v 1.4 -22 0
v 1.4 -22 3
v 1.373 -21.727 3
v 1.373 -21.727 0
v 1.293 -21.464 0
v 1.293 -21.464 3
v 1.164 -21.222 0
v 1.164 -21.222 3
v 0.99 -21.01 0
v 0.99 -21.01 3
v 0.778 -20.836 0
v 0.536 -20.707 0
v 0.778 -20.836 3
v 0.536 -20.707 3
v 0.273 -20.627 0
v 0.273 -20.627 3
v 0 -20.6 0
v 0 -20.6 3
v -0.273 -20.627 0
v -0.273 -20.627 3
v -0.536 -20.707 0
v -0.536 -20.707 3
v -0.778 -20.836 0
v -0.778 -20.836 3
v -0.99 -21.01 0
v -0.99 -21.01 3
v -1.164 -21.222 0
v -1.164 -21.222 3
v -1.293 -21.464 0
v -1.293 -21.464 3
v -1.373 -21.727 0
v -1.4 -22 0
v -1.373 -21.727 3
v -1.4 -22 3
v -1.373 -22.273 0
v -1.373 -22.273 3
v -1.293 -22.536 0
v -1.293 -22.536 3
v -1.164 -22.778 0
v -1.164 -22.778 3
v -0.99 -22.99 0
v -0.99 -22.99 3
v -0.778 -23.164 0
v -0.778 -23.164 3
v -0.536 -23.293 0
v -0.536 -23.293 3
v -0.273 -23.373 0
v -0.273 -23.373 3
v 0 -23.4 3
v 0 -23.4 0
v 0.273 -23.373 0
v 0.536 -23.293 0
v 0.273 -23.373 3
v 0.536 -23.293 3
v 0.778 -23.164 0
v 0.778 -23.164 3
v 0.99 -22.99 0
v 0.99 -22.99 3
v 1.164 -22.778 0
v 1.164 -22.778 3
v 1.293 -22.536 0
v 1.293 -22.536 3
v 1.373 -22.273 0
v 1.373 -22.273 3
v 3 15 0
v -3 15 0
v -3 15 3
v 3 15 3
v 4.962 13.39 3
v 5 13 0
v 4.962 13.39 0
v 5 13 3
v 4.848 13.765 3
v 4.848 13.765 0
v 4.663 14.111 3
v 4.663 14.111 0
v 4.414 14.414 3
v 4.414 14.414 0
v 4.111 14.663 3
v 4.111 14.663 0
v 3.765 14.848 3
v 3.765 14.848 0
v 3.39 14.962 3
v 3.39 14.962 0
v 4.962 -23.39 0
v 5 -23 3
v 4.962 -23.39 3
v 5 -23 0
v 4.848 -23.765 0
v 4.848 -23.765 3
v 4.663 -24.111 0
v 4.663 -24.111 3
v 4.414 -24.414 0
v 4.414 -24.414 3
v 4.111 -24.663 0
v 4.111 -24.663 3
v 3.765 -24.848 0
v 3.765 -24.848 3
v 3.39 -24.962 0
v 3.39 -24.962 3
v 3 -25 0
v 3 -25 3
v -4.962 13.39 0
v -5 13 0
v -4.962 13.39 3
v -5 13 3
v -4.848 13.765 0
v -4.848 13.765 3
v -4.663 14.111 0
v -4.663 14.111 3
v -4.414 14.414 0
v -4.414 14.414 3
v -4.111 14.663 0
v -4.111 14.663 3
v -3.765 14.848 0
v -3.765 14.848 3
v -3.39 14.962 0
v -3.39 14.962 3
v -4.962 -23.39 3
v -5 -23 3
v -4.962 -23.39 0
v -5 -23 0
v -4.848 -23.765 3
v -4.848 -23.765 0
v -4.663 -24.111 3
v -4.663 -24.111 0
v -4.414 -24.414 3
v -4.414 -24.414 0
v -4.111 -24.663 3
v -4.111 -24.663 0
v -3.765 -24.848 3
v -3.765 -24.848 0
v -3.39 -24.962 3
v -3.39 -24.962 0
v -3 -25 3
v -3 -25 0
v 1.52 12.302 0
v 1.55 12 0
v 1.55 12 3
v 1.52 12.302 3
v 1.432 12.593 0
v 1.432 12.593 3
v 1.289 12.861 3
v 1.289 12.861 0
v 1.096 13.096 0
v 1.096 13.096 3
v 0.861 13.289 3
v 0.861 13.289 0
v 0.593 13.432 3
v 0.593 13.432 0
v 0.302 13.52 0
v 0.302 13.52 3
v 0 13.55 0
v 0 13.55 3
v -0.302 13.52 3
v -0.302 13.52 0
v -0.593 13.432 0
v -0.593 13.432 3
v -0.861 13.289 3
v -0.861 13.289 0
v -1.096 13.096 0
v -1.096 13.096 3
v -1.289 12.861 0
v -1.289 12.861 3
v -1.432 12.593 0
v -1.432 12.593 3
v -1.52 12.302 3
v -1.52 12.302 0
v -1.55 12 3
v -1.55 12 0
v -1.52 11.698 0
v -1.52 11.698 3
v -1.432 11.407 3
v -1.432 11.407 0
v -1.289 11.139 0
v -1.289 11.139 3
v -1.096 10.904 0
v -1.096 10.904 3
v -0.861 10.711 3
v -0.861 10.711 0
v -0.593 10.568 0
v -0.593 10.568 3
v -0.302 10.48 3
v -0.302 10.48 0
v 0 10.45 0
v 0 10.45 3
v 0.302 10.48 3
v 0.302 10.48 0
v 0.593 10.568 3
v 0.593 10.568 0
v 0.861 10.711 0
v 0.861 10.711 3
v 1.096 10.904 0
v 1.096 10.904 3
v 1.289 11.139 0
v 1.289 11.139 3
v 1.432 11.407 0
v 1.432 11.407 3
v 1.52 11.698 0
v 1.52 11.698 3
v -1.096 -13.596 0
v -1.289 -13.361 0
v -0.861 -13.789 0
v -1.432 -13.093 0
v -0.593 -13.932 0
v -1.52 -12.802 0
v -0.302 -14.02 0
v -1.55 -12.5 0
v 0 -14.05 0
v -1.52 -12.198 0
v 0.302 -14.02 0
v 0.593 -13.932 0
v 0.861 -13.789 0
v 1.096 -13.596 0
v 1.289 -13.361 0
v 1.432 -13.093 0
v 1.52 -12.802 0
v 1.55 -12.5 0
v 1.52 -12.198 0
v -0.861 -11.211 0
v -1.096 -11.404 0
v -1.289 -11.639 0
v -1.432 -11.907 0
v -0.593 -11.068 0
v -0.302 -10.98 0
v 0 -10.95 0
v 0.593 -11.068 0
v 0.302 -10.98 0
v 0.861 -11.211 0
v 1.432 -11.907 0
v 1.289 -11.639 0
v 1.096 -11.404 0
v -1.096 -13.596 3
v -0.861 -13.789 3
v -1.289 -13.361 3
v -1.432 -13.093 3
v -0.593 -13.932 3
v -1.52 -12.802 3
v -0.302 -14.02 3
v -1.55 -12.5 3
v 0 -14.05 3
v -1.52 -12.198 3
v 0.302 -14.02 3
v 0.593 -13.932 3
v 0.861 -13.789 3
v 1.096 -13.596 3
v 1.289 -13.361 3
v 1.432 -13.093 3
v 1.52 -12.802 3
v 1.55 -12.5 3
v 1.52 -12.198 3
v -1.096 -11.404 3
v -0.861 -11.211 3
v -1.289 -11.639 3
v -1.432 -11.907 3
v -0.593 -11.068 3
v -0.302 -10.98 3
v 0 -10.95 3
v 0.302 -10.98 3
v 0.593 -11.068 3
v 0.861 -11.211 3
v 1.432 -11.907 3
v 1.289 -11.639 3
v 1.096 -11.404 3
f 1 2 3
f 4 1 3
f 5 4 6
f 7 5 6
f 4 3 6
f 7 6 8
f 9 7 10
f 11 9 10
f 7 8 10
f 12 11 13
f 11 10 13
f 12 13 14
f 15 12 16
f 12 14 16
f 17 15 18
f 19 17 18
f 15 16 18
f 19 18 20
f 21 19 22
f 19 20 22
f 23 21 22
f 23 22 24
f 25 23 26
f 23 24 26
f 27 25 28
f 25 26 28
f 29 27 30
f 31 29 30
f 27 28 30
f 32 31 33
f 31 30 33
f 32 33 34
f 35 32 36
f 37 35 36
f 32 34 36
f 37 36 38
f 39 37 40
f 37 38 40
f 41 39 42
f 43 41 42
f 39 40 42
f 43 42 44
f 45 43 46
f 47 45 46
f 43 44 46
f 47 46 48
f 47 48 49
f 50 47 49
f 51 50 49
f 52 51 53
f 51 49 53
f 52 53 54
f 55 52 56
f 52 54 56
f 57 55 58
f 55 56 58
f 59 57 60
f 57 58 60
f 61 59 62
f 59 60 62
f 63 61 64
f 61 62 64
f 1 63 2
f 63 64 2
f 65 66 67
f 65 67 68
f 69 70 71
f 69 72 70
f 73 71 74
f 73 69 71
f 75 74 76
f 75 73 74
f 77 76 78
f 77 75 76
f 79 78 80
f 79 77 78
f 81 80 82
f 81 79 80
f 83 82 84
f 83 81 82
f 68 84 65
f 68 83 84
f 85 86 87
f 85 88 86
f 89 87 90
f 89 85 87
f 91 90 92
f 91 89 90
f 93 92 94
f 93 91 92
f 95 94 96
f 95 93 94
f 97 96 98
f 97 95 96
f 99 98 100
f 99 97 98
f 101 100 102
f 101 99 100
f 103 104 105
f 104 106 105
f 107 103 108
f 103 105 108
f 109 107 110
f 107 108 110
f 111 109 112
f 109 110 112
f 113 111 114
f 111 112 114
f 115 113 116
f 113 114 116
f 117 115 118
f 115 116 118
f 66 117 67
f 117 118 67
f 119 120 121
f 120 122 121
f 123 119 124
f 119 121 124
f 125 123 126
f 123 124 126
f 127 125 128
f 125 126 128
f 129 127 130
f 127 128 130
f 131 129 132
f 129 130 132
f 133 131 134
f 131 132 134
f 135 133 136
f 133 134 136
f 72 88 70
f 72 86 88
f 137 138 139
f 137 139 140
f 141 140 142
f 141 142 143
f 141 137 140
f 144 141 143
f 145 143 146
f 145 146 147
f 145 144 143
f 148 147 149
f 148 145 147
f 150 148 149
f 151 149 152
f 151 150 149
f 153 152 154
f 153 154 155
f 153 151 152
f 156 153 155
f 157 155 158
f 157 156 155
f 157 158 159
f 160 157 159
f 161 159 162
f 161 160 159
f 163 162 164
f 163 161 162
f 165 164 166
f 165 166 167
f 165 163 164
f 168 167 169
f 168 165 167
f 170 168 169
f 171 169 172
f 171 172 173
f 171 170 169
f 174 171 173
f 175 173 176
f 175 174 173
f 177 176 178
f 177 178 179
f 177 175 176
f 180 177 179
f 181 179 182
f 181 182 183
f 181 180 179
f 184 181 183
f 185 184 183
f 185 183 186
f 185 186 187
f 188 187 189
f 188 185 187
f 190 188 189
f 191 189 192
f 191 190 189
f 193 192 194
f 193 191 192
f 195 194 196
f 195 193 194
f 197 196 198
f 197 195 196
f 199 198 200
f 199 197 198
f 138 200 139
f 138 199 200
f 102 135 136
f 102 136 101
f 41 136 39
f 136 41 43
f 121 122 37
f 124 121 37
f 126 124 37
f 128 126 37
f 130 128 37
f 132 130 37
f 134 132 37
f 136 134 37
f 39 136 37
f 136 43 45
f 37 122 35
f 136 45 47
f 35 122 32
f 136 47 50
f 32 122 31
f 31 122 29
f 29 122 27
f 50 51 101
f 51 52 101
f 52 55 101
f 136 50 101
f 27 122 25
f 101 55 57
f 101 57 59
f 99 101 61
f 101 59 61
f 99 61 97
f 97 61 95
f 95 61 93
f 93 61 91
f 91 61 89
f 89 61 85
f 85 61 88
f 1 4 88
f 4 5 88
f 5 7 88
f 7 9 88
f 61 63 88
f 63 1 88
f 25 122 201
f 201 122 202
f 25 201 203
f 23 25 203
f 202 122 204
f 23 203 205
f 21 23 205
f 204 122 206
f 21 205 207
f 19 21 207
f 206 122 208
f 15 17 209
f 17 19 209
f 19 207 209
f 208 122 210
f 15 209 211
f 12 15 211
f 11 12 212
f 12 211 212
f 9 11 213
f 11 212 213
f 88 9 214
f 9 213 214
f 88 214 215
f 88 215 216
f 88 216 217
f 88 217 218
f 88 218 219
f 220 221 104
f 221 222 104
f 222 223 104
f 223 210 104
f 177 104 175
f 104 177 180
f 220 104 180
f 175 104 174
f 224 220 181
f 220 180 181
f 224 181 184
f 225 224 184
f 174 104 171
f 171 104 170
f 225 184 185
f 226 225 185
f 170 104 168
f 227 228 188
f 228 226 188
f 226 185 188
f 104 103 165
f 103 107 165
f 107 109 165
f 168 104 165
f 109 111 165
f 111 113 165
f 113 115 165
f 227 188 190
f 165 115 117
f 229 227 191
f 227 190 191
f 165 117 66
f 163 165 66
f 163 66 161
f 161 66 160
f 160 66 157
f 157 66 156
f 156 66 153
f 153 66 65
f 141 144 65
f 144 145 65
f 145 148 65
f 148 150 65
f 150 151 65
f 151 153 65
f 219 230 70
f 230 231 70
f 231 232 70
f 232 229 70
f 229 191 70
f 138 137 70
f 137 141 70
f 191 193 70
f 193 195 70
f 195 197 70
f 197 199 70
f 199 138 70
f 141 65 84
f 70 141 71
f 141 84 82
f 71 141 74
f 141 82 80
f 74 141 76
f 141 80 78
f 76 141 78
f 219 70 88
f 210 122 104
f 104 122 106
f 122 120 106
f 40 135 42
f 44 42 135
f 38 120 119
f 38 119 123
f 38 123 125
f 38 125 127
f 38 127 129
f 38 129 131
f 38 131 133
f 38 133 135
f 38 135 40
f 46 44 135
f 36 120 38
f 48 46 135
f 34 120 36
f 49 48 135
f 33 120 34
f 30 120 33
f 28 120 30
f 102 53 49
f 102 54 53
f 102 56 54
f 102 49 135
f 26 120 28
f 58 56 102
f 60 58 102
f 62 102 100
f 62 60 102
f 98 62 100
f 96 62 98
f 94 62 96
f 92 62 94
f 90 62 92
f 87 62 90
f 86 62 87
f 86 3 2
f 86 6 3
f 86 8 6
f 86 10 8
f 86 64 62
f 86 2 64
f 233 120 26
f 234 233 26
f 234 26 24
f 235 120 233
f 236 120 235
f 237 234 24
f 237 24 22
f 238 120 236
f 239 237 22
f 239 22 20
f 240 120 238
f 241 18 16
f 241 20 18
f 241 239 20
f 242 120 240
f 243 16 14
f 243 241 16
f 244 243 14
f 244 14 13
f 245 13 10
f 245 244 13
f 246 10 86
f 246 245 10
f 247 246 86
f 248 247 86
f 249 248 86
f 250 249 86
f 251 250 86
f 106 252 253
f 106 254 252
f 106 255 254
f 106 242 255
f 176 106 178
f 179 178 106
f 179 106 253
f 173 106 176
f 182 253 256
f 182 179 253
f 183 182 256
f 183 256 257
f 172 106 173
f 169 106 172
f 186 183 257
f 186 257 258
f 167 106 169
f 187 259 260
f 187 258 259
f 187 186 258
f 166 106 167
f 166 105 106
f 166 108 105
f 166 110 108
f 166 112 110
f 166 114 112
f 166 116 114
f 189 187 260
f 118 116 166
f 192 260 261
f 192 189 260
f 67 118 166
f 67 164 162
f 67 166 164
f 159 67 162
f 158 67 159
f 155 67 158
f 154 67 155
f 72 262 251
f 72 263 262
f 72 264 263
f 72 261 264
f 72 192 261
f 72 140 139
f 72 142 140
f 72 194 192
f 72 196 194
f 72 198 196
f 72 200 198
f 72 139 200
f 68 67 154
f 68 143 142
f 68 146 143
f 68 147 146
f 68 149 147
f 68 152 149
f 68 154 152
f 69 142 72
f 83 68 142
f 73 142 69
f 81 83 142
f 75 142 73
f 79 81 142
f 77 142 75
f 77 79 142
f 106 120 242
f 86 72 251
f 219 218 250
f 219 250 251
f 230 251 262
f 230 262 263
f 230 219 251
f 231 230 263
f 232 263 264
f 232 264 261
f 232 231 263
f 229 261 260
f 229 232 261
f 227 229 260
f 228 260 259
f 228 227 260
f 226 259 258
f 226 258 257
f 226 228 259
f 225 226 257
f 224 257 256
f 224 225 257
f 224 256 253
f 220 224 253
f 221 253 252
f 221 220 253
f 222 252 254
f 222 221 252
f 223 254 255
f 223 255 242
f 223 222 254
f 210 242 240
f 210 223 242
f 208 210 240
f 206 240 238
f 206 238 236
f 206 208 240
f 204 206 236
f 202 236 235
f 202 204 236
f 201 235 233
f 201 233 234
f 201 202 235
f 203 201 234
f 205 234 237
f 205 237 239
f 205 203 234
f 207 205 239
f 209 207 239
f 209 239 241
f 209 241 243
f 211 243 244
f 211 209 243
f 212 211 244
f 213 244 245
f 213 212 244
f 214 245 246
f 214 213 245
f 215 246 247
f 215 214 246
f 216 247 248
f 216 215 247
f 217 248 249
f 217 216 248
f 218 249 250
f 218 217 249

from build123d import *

# Parameters (mm, degrees)
ESQUISSE1_W        = 10
ESQUISSE1_H        = 30
ESQUISSE1_R        = 1.55
BOSS_EXTRU_1_DEPTH = 3
ESQUISSE3_W        = 10
ESQUISSE3_H        = 10
ESQUISSE3_R        = 1.4
BOSS_EXTRU_2_DEPTH = 3
CONG_1_R           = 2


with BuildPart() as part:
    # Esquisse1 → Boss.-Extru.1 (new body)
    with BuildSketch(Plane.XY):
        Rectangle(ESQUISSE1_W, ESQUISSE1_H)
        with Locations((0, 12)):
            Circle(ESQUISSE1_R, mode=Mode.SUBTRACT)
        with Locations((0, -12.5)):
            Circle(ESQUISSE1_R, mode=Mode.SUBTRACT)
    extrude(amount=BOSS_EXTRU_1_DEPTH)

    # Esquisse3 → Boss.-Extru.2 (add)
    with BuildSketch(Plane.XY.offset(3)):
        with Locations((0, -20)):
            Rectangle(ESQUISSE3_W, ESQUISSE3_H)
        with Locations((0, -22)):
            Circle(ESQUISSE3_R, mode=Mode.SUBTRACT)
    extrude(amount=-BOSS_EXTRU_2_DEPTH)

    # Congé1
    cong_1_edges = [part.edges().sort_by_distance(p)[0] for p in [
        (-5, -25, 1.5),
        (5, -25, 1.5),
        (-5, 15, 1.5),
        (5, 15, 1.5),
    ]]
    fillet(cong_1_edges, radius=CONG_1_R)


solid = part.part
